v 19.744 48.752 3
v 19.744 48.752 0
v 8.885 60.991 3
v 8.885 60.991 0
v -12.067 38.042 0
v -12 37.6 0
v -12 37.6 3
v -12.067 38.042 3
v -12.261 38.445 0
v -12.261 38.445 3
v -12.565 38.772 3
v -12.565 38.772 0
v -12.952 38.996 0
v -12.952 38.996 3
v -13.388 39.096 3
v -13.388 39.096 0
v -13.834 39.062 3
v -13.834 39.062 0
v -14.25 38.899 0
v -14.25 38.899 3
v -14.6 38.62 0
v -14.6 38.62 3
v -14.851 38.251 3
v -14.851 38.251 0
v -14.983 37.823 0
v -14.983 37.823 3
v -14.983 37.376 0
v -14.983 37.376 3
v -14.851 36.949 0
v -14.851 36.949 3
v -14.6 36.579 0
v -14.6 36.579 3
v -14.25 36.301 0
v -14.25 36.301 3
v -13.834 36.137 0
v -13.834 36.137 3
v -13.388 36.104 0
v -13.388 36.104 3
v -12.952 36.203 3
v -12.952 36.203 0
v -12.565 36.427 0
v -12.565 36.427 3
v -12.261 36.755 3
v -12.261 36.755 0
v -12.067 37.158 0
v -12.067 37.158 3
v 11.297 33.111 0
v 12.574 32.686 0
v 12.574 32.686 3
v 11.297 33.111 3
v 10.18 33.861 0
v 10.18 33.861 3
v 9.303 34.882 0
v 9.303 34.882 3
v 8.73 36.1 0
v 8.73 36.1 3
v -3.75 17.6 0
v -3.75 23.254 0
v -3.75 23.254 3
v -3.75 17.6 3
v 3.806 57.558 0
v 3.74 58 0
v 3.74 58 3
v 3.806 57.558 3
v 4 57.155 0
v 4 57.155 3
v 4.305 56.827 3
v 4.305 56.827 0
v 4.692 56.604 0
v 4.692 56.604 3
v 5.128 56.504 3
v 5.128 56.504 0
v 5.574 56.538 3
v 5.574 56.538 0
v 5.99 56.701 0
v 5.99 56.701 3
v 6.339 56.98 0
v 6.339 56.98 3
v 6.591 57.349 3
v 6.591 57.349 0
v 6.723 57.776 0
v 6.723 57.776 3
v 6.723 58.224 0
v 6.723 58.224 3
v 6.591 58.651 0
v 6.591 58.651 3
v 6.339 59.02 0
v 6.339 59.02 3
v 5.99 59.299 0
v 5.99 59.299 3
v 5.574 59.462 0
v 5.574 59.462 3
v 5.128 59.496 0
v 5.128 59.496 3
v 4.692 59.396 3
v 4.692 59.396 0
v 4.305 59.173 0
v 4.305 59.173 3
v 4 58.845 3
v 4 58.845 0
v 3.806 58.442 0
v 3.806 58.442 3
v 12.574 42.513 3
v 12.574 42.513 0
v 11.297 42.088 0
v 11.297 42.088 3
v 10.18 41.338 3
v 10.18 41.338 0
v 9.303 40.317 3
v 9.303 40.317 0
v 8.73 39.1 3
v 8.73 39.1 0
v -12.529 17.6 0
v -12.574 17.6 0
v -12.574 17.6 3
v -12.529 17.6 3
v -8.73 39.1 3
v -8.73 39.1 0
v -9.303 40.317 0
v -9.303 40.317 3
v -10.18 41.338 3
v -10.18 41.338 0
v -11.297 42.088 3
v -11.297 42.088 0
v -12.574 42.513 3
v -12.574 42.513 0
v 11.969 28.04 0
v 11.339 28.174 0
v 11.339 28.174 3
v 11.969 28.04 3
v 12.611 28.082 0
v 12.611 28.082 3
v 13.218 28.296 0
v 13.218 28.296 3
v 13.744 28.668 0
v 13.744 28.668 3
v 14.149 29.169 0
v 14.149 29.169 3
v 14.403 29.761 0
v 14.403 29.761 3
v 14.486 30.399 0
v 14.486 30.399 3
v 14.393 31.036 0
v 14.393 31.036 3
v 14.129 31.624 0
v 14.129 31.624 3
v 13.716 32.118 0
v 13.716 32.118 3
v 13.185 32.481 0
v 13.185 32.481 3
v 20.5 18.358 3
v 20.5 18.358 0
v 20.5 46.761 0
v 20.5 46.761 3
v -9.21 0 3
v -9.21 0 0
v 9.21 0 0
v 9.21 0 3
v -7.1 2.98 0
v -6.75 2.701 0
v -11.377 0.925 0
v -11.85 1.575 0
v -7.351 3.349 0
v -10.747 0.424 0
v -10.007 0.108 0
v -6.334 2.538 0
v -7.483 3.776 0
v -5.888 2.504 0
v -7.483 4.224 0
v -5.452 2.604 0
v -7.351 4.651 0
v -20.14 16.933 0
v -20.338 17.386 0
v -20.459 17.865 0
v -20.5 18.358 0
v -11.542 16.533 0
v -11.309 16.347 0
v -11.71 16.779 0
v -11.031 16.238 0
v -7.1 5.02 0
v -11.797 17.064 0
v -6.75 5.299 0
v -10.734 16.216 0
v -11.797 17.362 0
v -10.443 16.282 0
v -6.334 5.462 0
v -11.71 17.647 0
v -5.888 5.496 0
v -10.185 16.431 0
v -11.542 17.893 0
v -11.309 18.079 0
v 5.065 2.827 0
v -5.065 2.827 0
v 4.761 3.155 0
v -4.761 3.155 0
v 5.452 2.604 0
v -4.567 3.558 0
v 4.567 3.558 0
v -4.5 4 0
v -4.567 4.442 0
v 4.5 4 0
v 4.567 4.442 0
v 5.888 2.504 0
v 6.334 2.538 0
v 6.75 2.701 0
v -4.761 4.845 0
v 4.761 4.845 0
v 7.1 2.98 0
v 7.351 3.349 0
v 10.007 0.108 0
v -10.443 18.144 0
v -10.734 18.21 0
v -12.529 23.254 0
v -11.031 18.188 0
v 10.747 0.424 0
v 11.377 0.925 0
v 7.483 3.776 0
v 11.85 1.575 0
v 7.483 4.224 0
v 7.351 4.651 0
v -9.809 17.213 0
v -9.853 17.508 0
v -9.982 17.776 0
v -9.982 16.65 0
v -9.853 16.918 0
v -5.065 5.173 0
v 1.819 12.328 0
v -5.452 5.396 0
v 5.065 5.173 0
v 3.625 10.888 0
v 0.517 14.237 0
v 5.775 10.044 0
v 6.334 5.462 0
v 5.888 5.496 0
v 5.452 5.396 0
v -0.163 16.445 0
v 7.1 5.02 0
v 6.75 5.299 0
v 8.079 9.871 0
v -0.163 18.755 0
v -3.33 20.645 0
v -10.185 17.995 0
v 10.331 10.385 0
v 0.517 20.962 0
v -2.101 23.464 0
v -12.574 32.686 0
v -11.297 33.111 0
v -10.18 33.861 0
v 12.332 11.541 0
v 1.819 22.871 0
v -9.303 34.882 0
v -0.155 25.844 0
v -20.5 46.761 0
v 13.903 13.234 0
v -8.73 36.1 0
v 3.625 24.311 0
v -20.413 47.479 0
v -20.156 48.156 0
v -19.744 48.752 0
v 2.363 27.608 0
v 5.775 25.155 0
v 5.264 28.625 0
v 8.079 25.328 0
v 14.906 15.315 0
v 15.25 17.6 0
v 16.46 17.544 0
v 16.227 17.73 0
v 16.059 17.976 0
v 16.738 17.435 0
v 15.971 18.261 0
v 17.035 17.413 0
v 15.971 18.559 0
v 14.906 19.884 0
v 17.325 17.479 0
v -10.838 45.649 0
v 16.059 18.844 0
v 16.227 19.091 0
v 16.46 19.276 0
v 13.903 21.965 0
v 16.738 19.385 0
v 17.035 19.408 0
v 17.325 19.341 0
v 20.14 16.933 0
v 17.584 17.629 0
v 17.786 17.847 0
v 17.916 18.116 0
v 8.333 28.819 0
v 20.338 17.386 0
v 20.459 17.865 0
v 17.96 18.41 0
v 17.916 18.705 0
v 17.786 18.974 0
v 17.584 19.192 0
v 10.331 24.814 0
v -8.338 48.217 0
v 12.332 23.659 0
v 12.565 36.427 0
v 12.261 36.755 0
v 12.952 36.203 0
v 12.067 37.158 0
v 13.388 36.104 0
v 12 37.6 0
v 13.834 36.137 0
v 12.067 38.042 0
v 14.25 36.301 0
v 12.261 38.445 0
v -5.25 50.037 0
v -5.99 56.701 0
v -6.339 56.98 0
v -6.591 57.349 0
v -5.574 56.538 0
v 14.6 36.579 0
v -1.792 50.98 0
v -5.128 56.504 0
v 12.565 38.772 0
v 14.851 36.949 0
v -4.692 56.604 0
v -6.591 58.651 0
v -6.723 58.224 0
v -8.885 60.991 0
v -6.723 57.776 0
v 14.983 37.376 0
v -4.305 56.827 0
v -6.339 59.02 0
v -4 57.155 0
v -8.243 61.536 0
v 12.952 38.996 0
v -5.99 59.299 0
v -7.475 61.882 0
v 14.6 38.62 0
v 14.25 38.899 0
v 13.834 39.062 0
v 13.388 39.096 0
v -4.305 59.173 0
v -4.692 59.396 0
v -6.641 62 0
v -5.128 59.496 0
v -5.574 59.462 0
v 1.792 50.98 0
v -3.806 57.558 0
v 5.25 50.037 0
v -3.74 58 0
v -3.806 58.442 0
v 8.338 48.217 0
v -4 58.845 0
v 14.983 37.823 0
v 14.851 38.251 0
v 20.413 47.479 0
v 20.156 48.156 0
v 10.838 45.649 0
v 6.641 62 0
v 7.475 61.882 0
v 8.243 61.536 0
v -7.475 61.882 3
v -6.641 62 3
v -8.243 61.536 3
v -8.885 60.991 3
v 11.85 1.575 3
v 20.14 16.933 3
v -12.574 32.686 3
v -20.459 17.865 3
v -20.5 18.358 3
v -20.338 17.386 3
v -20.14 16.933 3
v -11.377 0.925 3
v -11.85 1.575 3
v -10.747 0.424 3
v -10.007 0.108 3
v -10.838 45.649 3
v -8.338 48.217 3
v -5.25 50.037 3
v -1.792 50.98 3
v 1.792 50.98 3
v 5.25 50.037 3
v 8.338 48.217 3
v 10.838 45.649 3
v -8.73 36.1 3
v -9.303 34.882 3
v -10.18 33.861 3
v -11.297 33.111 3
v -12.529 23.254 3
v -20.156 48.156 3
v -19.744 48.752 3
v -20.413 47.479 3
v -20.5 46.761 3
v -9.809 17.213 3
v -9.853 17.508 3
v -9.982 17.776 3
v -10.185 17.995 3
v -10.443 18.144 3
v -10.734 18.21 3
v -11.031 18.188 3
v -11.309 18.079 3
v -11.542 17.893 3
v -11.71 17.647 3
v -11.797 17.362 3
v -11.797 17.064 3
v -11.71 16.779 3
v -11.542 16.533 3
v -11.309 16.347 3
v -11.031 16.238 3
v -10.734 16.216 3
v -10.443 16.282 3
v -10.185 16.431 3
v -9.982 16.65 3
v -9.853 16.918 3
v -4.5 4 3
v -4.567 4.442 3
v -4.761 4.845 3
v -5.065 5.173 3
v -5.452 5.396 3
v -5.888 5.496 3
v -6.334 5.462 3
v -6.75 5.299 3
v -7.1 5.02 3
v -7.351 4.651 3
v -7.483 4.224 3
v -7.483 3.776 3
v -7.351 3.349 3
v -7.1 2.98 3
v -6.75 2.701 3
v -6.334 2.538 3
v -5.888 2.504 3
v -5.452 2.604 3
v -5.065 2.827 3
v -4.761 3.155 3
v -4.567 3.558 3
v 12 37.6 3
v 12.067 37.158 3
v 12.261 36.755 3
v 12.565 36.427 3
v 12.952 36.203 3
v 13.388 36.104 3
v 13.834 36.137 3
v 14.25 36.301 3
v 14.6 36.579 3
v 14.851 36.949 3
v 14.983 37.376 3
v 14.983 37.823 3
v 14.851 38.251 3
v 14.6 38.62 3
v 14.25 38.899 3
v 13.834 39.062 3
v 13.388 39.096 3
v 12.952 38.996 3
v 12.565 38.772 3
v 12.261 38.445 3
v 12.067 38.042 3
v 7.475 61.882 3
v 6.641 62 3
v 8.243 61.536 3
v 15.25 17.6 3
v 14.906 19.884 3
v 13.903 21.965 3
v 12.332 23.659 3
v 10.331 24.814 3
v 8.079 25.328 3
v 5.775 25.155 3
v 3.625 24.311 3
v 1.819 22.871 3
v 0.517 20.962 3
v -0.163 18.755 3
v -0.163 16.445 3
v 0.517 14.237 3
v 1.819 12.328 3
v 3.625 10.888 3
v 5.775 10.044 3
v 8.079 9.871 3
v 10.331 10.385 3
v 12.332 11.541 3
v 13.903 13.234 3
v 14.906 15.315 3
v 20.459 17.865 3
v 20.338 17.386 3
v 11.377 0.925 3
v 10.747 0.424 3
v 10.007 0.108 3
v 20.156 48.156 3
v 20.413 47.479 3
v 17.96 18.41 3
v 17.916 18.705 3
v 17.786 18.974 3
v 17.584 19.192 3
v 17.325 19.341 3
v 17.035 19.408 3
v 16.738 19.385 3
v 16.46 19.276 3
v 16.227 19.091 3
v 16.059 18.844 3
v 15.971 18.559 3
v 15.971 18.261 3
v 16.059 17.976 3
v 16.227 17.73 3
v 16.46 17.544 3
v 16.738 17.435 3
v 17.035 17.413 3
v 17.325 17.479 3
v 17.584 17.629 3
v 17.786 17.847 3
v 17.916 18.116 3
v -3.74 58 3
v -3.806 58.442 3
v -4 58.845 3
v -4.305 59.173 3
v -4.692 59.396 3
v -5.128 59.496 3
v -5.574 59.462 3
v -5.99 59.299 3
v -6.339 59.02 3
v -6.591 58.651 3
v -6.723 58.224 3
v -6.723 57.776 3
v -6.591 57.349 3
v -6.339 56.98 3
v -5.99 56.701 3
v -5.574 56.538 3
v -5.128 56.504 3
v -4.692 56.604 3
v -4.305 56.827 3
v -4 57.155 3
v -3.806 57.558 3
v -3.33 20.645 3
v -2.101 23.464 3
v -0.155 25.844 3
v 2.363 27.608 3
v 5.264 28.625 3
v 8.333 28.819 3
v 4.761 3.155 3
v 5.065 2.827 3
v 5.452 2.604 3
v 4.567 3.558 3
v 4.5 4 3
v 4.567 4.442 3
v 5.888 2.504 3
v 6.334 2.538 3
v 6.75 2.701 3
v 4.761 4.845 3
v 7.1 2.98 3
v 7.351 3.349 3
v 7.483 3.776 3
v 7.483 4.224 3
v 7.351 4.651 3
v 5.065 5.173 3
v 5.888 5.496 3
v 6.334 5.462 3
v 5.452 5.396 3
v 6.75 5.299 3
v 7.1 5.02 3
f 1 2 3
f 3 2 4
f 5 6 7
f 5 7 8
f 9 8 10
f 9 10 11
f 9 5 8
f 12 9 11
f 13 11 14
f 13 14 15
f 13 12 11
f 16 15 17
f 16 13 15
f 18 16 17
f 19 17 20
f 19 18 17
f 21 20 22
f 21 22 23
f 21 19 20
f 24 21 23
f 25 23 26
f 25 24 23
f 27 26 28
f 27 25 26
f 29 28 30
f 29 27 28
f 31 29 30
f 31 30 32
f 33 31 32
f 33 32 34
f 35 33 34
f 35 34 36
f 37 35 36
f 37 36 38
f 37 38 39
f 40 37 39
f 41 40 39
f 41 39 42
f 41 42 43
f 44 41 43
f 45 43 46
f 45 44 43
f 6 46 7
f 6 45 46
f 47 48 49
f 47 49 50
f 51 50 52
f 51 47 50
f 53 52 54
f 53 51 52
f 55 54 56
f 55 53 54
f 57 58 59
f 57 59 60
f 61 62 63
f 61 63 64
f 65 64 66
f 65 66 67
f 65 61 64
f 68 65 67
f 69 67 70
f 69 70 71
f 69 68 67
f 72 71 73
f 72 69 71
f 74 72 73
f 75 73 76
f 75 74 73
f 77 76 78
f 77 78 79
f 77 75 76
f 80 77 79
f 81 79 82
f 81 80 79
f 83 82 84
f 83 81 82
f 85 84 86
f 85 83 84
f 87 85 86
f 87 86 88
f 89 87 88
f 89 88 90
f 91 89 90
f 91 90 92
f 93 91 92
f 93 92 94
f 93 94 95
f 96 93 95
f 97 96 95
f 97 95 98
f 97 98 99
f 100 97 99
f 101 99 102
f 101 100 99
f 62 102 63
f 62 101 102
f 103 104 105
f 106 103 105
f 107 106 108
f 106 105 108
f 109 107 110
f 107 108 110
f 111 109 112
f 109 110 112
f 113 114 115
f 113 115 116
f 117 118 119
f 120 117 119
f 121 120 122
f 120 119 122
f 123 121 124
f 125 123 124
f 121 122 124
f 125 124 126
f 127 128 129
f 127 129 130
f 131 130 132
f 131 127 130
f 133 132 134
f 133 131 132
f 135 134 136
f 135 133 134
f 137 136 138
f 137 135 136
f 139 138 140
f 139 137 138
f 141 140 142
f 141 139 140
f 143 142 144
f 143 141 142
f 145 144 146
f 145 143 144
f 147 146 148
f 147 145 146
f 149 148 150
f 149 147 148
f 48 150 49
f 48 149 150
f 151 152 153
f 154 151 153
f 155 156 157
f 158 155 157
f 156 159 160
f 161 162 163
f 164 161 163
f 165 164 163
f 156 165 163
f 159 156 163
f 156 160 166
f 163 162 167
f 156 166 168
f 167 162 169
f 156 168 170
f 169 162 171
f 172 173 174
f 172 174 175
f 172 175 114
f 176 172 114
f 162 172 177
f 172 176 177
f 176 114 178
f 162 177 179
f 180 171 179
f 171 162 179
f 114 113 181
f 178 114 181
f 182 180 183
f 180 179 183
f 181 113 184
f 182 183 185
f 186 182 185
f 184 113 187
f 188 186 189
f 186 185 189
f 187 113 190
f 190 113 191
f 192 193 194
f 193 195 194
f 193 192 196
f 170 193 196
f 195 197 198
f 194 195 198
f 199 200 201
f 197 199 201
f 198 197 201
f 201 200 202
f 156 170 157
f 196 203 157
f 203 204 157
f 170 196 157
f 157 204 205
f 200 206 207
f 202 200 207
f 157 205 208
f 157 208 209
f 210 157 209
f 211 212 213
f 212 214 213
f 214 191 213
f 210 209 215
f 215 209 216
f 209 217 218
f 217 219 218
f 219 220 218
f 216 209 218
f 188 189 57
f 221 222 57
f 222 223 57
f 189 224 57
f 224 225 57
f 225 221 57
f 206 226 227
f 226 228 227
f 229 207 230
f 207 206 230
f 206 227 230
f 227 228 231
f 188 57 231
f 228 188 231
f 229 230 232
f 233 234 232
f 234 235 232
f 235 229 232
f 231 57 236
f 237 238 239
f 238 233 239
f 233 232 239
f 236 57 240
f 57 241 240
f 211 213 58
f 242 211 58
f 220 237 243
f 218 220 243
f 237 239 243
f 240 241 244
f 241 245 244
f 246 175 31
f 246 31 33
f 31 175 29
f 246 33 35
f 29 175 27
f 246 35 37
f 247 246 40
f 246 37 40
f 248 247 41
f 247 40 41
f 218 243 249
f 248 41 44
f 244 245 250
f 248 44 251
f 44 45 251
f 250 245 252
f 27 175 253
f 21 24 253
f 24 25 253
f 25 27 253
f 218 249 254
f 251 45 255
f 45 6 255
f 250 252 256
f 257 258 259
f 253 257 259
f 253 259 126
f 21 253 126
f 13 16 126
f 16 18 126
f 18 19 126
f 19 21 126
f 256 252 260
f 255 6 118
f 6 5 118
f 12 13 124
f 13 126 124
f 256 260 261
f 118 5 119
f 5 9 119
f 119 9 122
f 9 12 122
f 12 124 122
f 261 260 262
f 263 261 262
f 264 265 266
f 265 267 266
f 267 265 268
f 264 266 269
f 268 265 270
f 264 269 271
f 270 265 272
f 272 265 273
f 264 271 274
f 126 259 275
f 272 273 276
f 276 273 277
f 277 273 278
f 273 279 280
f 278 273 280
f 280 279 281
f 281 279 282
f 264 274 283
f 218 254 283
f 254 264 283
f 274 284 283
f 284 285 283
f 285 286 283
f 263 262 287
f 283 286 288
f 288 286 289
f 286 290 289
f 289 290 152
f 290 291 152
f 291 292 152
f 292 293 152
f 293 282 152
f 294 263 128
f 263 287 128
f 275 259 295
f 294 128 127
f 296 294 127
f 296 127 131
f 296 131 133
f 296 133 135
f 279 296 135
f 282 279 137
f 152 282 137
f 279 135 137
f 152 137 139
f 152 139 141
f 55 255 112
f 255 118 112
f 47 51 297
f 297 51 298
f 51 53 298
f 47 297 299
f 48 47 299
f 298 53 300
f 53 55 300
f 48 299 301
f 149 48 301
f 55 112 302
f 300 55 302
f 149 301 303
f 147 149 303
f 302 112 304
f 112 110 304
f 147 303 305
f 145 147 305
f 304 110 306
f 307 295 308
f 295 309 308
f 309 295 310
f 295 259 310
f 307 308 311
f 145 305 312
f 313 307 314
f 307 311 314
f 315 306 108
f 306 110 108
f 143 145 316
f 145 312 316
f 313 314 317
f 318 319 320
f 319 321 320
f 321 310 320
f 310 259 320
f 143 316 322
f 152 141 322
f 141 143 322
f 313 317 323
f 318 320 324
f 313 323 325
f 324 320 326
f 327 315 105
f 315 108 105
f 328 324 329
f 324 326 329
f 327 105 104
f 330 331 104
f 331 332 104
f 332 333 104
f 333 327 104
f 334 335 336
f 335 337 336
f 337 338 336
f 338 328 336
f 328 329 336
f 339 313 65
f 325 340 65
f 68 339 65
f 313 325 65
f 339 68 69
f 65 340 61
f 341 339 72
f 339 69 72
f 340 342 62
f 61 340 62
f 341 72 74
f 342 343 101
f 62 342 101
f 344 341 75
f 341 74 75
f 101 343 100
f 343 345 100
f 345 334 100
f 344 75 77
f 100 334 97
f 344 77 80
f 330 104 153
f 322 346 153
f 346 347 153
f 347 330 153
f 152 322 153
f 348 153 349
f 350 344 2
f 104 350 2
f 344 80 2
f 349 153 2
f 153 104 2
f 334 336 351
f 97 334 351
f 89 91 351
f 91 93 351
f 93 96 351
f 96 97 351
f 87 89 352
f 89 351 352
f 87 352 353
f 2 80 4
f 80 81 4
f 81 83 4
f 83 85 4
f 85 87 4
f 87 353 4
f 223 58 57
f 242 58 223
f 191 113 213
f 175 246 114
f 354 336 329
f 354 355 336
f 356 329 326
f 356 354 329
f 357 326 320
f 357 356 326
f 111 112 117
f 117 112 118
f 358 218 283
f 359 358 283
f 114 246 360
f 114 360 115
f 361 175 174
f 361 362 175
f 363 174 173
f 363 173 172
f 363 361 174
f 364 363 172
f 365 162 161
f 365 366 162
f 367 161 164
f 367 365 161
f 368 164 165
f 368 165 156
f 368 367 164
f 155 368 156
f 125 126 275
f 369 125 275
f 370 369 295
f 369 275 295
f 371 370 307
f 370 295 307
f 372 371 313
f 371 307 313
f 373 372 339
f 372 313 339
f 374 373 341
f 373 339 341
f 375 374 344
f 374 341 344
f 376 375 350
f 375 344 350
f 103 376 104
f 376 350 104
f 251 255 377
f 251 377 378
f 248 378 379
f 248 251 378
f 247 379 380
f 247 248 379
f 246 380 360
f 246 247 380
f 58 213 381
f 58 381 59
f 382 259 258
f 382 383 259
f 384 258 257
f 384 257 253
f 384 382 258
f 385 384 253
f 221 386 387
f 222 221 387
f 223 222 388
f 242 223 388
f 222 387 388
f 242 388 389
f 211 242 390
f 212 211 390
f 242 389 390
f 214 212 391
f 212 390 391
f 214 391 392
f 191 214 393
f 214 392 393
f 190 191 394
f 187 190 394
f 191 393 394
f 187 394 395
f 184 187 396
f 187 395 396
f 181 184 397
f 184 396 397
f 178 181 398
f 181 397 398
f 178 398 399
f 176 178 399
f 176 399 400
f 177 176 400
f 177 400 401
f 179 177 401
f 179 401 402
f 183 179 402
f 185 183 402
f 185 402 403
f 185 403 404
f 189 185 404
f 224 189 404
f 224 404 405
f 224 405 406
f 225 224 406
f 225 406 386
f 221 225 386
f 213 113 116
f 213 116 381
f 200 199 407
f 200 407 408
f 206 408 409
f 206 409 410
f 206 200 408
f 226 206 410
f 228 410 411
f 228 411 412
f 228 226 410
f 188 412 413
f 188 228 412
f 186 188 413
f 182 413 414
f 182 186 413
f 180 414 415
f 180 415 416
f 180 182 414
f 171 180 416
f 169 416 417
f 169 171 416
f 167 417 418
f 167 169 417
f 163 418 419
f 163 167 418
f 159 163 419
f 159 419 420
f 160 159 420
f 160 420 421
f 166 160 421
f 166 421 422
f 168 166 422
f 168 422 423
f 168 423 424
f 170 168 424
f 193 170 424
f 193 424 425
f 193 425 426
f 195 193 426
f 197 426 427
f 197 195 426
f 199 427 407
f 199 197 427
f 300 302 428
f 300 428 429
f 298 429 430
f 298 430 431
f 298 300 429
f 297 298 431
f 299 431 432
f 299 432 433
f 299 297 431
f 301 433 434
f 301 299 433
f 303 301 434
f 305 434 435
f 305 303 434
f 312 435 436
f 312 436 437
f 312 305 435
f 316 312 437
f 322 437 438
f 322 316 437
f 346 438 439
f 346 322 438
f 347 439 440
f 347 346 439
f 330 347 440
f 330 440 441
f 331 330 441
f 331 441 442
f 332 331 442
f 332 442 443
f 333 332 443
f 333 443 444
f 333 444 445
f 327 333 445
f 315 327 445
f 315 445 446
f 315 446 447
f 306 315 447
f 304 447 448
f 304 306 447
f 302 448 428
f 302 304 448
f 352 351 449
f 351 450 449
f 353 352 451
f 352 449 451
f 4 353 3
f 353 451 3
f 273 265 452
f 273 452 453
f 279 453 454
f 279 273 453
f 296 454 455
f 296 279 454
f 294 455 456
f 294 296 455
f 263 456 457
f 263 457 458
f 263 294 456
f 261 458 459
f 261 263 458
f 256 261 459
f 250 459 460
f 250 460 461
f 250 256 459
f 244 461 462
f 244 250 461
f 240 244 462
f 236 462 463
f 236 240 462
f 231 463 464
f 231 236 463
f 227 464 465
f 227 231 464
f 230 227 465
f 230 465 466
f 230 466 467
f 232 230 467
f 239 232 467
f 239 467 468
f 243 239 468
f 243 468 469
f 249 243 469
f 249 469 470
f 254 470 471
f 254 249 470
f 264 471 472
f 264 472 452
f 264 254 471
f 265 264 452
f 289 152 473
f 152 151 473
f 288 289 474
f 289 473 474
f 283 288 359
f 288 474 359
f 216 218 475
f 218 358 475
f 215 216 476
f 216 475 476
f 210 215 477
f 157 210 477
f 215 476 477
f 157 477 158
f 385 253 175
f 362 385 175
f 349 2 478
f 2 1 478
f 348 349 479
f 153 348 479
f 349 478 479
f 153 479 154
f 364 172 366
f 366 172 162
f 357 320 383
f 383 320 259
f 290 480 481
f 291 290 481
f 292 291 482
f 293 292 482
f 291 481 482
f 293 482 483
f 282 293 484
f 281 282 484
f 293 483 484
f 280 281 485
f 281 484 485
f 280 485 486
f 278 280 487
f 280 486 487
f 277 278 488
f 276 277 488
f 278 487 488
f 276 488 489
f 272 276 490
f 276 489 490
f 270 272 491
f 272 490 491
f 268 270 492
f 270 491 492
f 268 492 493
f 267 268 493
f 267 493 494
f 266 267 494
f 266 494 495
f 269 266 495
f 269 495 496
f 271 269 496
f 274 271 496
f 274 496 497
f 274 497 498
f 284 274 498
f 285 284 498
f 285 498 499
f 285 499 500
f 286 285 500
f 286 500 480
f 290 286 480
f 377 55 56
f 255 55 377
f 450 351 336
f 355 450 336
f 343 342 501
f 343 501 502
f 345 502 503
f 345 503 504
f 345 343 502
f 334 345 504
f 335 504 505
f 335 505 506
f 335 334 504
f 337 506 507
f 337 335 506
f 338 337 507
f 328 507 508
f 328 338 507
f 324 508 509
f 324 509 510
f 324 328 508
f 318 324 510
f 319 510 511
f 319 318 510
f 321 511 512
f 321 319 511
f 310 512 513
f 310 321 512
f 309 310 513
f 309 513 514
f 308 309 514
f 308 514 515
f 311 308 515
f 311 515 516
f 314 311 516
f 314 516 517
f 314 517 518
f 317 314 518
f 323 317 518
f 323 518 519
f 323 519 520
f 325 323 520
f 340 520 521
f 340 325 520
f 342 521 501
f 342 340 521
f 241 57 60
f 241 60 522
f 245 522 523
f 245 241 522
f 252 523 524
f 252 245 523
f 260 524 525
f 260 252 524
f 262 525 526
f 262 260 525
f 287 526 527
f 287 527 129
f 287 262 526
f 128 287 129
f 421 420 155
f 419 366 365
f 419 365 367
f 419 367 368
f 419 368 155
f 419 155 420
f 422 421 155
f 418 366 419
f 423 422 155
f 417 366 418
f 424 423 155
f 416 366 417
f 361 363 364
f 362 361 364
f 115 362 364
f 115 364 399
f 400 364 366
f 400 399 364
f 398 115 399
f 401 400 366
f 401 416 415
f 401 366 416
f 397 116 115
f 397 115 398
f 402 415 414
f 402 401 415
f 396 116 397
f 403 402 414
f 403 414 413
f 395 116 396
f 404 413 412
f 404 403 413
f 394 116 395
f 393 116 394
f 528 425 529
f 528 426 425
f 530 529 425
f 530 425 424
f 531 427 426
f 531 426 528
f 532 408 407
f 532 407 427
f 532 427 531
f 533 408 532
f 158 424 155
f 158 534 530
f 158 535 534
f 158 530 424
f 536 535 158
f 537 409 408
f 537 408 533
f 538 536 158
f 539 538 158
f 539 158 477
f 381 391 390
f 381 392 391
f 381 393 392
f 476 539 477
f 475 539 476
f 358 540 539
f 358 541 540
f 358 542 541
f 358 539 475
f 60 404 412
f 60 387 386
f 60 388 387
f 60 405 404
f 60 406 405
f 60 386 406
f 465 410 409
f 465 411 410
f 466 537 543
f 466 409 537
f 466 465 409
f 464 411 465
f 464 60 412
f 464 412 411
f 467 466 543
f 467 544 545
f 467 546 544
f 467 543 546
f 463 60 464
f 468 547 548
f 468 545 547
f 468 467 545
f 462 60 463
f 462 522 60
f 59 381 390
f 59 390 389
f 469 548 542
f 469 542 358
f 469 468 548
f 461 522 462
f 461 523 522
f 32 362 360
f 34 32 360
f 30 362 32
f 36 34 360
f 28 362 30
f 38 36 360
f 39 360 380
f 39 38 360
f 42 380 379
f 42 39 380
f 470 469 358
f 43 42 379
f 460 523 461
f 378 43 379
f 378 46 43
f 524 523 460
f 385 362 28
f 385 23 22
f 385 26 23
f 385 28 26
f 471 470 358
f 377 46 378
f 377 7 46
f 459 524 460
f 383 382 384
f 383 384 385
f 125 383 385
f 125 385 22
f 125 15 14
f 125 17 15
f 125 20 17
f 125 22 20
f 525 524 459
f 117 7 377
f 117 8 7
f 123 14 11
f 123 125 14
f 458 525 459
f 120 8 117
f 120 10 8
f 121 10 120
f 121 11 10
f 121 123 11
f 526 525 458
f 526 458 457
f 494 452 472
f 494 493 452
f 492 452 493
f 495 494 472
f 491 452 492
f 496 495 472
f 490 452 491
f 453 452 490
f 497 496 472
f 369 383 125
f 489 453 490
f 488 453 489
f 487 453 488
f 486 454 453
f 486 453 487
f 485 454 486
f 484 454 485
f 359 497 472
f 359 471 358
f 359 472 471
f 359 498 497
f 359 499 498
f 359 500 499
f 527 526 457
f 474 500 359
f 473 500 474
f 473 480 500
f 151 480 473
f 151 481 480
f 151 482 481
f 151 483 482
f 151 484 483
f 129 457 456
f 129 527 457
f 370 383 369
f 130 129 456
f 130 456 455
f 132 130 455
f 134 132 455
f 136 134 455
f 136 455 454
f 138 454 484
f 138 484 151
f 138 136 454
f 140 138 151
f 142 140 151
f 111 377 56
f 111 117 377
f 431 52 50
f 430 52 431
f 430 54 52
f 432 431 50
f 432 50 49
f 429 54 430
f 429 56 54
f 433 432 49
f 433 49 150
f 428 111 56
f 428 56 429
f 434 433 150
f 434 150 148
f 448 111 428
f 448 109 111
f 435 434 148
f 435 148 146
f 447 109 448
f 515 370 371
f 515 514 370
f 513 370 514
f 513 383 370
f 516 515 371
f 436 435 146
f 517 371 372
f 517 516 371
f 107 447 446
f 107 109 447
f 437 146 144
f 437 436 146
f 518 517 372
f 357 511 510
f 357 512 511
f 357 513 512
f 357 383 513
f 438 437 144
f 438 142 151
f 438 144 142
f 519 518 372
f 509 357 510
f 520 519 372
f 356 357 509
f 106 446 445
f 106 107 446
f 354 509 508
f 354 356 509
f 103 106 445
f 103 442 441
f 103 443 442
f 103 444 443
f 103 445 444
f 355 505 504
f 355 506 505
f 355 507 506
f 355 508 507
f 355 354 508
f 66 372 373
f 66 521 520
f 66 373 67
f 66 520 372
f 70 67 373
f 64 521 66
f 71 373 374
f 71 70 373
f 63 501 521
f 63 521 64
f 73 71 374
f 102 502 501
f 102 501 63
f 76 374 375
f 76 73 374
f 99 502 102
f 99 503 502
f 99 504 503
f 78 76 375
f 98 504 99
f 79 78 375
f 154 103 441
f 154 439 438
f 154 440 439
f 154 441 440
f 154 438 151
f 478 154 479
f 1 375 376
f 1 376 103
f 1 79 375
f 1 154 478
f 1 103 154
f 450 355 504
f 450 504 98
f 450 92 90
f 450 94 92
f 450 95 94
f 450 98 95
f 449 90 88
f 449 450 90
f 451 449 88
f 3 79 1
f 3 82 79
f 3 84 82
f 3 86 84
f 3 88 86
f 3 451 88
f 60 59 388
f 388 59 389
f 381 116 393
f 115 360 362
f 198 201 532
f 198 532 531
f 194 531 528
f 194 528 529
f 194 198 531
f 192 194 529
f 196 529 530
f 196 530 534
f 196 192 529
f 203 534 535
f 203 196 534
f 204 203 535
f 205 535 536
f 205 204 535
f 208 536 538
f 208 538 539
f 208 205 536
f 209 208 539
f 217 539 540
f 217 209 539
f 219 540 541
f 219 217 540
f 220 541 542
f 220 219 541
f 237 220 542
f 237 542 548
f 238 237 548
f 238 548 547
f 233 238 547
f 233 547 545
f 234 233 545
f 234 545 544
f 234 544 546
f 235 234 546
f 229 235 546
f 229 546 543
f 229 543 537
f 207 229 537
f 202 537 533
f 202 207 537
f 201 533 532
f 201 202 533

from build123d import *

# Parameters (mm, degrees)
SKETCH1_R           = 1.5
SKETCH1_R_2         = 7.75
BOSS_EXTRUDE1_DEPTH = 3
FILLET1_R           = 3
SKETCH2_R           = 1
CUT_EXTRUDE1_DEPTH  = 10


with BuildPart() as part:
    # Sketch1 → Boss-Extrude1 (new body)
    with BuildSketch(Plane.XY):
        Polygon((7.989824602, 62), (-7.989824602, 62), (-20.5, 47.899715907), (-20.5, 17.599715907), (-11, 0), (0, 0), (11, 0), (20.5, 17.599715907), (20.5, 47.899715907), align=None)
        with Locations((-6, 4)):
            Circle(SKETCH1_R, mode=Mode.SUBTRACT)
        with Locations((-13.5, 37.599715907)):
            Circle(SKETCH1_R, mode=Mode.SUBTRACT)
        with Locations((-5.239824602, 58)):
            Circle(SKETCH1_R, mode=Mode.SUBTRACT)
        with Locations(Location((5.239824602, 58, 0), (0, 0, 180))):
            Circle(SKETCH1_R, mode=Mode.SUBTRACT)
        with Locations(Location((13.5, 37.599715907, 0), (0, 0, 180))):
            Circle(SKETCH1_R, mode=Mode.SUBTRACT)
        with Locations(Location((6, 4, 0), (0, 0, 180))):
            Circle(SKETCH1_R, mode=Mode.SUBTRACT)
        with Locations((7.5, 17.599715907)):
            Circle(SKETCH1_R_2, mode=Mode.SUBTRACT)
        with BuildLine():
            Line((8.730303993, 36.099715907), (-8.730303993, 36.099715907))
            ThreePointArc((-8.730303993, 36.099715907), (-10.179901517, 33.861140502), (-12.574074074, 32.686197699))
            Line((-12.574074074, 32.686197699), (-12.574074074, 17.599715907))
            Line((-12.574074074, 17.599715907), (-12.52949298, 17.599715907))
            Line((-12.52949298, 17.599715907), (-12.52949298, 23.253614409))
            Line((-12.52949298, 23.253614409), (-3.75, 23.253614409))
            Line((-3.75, 23.253614409), (-3.75, 17.599715907))
            ThreePointArc((-3.75, 17.599715907), (1.043381087, 26.812455576), (11.338812838, 28.174497985))
            ThreePointArc((11.338812838, 28.174497985), (14.402792388, 29.760560356), (12.574074074, 32.686197699))
            ThreePointArc((12.574074074, 32.686197699), (10.179901517, 33.861140502), (8.730303993, 36.099715907))
        make_face(mode=Mode.SUBTRACT)
        with BuildLine():
            Line((8.730303993, 39.099715907), (-8.730303993, 39.099715907))
            ThreePointArc((-8.730303993, 39.099715907), (-10.179901517, 41.338291312), (-12.574074074, 42.513234115))
            ThreePointArc((-12.574074074, 42.513234115), (0, 51.099715907), (12.574074074, 42.513234115))
            ThreePointArc((12.574074074, 42.513234115), (10.179901517, 41.338291312), (8.730303993, 39.099715907))
        make_face(mode=Mode.SUBTRACT)
    extrude(amount=BOSS_EXTRUDE1_DEPTH)

    # Fillet1
    fillet1_edges = [part.edges().sort_by_distance(p)[0] for p in [
        (-11, 0, 1.5),
        (-20.5, 17.599715907, 1.5),
        (-20.5, 47.899715907, 1.5),
        (-7.989824602, 62, 1.5),
        (7.989824602, 62, 1.5),
        (20.5, 47.899715907, 1.5),
        (20.5, 17.599715907, 1.5),
        (11, 0, 1.5),
    ]]
    fillet(fillet1_edges, radius=FILLET1_R)

    # Sketch2 → Cut-Extrude1 (cut)
    with BuildSketch(Plane.XY.offset(3)):
        with Locations((16.960133769, 18.410352932)):
            Circle(SKETCH2_R)
        with Locations((-10.808600311, 17.213150766)):
            Circle(SKETCH2_R)
    extrude(amount=-CUT_EXTRUDE1_DEPTH, mode=Mode.SUBTRACT)


solid = part.part
